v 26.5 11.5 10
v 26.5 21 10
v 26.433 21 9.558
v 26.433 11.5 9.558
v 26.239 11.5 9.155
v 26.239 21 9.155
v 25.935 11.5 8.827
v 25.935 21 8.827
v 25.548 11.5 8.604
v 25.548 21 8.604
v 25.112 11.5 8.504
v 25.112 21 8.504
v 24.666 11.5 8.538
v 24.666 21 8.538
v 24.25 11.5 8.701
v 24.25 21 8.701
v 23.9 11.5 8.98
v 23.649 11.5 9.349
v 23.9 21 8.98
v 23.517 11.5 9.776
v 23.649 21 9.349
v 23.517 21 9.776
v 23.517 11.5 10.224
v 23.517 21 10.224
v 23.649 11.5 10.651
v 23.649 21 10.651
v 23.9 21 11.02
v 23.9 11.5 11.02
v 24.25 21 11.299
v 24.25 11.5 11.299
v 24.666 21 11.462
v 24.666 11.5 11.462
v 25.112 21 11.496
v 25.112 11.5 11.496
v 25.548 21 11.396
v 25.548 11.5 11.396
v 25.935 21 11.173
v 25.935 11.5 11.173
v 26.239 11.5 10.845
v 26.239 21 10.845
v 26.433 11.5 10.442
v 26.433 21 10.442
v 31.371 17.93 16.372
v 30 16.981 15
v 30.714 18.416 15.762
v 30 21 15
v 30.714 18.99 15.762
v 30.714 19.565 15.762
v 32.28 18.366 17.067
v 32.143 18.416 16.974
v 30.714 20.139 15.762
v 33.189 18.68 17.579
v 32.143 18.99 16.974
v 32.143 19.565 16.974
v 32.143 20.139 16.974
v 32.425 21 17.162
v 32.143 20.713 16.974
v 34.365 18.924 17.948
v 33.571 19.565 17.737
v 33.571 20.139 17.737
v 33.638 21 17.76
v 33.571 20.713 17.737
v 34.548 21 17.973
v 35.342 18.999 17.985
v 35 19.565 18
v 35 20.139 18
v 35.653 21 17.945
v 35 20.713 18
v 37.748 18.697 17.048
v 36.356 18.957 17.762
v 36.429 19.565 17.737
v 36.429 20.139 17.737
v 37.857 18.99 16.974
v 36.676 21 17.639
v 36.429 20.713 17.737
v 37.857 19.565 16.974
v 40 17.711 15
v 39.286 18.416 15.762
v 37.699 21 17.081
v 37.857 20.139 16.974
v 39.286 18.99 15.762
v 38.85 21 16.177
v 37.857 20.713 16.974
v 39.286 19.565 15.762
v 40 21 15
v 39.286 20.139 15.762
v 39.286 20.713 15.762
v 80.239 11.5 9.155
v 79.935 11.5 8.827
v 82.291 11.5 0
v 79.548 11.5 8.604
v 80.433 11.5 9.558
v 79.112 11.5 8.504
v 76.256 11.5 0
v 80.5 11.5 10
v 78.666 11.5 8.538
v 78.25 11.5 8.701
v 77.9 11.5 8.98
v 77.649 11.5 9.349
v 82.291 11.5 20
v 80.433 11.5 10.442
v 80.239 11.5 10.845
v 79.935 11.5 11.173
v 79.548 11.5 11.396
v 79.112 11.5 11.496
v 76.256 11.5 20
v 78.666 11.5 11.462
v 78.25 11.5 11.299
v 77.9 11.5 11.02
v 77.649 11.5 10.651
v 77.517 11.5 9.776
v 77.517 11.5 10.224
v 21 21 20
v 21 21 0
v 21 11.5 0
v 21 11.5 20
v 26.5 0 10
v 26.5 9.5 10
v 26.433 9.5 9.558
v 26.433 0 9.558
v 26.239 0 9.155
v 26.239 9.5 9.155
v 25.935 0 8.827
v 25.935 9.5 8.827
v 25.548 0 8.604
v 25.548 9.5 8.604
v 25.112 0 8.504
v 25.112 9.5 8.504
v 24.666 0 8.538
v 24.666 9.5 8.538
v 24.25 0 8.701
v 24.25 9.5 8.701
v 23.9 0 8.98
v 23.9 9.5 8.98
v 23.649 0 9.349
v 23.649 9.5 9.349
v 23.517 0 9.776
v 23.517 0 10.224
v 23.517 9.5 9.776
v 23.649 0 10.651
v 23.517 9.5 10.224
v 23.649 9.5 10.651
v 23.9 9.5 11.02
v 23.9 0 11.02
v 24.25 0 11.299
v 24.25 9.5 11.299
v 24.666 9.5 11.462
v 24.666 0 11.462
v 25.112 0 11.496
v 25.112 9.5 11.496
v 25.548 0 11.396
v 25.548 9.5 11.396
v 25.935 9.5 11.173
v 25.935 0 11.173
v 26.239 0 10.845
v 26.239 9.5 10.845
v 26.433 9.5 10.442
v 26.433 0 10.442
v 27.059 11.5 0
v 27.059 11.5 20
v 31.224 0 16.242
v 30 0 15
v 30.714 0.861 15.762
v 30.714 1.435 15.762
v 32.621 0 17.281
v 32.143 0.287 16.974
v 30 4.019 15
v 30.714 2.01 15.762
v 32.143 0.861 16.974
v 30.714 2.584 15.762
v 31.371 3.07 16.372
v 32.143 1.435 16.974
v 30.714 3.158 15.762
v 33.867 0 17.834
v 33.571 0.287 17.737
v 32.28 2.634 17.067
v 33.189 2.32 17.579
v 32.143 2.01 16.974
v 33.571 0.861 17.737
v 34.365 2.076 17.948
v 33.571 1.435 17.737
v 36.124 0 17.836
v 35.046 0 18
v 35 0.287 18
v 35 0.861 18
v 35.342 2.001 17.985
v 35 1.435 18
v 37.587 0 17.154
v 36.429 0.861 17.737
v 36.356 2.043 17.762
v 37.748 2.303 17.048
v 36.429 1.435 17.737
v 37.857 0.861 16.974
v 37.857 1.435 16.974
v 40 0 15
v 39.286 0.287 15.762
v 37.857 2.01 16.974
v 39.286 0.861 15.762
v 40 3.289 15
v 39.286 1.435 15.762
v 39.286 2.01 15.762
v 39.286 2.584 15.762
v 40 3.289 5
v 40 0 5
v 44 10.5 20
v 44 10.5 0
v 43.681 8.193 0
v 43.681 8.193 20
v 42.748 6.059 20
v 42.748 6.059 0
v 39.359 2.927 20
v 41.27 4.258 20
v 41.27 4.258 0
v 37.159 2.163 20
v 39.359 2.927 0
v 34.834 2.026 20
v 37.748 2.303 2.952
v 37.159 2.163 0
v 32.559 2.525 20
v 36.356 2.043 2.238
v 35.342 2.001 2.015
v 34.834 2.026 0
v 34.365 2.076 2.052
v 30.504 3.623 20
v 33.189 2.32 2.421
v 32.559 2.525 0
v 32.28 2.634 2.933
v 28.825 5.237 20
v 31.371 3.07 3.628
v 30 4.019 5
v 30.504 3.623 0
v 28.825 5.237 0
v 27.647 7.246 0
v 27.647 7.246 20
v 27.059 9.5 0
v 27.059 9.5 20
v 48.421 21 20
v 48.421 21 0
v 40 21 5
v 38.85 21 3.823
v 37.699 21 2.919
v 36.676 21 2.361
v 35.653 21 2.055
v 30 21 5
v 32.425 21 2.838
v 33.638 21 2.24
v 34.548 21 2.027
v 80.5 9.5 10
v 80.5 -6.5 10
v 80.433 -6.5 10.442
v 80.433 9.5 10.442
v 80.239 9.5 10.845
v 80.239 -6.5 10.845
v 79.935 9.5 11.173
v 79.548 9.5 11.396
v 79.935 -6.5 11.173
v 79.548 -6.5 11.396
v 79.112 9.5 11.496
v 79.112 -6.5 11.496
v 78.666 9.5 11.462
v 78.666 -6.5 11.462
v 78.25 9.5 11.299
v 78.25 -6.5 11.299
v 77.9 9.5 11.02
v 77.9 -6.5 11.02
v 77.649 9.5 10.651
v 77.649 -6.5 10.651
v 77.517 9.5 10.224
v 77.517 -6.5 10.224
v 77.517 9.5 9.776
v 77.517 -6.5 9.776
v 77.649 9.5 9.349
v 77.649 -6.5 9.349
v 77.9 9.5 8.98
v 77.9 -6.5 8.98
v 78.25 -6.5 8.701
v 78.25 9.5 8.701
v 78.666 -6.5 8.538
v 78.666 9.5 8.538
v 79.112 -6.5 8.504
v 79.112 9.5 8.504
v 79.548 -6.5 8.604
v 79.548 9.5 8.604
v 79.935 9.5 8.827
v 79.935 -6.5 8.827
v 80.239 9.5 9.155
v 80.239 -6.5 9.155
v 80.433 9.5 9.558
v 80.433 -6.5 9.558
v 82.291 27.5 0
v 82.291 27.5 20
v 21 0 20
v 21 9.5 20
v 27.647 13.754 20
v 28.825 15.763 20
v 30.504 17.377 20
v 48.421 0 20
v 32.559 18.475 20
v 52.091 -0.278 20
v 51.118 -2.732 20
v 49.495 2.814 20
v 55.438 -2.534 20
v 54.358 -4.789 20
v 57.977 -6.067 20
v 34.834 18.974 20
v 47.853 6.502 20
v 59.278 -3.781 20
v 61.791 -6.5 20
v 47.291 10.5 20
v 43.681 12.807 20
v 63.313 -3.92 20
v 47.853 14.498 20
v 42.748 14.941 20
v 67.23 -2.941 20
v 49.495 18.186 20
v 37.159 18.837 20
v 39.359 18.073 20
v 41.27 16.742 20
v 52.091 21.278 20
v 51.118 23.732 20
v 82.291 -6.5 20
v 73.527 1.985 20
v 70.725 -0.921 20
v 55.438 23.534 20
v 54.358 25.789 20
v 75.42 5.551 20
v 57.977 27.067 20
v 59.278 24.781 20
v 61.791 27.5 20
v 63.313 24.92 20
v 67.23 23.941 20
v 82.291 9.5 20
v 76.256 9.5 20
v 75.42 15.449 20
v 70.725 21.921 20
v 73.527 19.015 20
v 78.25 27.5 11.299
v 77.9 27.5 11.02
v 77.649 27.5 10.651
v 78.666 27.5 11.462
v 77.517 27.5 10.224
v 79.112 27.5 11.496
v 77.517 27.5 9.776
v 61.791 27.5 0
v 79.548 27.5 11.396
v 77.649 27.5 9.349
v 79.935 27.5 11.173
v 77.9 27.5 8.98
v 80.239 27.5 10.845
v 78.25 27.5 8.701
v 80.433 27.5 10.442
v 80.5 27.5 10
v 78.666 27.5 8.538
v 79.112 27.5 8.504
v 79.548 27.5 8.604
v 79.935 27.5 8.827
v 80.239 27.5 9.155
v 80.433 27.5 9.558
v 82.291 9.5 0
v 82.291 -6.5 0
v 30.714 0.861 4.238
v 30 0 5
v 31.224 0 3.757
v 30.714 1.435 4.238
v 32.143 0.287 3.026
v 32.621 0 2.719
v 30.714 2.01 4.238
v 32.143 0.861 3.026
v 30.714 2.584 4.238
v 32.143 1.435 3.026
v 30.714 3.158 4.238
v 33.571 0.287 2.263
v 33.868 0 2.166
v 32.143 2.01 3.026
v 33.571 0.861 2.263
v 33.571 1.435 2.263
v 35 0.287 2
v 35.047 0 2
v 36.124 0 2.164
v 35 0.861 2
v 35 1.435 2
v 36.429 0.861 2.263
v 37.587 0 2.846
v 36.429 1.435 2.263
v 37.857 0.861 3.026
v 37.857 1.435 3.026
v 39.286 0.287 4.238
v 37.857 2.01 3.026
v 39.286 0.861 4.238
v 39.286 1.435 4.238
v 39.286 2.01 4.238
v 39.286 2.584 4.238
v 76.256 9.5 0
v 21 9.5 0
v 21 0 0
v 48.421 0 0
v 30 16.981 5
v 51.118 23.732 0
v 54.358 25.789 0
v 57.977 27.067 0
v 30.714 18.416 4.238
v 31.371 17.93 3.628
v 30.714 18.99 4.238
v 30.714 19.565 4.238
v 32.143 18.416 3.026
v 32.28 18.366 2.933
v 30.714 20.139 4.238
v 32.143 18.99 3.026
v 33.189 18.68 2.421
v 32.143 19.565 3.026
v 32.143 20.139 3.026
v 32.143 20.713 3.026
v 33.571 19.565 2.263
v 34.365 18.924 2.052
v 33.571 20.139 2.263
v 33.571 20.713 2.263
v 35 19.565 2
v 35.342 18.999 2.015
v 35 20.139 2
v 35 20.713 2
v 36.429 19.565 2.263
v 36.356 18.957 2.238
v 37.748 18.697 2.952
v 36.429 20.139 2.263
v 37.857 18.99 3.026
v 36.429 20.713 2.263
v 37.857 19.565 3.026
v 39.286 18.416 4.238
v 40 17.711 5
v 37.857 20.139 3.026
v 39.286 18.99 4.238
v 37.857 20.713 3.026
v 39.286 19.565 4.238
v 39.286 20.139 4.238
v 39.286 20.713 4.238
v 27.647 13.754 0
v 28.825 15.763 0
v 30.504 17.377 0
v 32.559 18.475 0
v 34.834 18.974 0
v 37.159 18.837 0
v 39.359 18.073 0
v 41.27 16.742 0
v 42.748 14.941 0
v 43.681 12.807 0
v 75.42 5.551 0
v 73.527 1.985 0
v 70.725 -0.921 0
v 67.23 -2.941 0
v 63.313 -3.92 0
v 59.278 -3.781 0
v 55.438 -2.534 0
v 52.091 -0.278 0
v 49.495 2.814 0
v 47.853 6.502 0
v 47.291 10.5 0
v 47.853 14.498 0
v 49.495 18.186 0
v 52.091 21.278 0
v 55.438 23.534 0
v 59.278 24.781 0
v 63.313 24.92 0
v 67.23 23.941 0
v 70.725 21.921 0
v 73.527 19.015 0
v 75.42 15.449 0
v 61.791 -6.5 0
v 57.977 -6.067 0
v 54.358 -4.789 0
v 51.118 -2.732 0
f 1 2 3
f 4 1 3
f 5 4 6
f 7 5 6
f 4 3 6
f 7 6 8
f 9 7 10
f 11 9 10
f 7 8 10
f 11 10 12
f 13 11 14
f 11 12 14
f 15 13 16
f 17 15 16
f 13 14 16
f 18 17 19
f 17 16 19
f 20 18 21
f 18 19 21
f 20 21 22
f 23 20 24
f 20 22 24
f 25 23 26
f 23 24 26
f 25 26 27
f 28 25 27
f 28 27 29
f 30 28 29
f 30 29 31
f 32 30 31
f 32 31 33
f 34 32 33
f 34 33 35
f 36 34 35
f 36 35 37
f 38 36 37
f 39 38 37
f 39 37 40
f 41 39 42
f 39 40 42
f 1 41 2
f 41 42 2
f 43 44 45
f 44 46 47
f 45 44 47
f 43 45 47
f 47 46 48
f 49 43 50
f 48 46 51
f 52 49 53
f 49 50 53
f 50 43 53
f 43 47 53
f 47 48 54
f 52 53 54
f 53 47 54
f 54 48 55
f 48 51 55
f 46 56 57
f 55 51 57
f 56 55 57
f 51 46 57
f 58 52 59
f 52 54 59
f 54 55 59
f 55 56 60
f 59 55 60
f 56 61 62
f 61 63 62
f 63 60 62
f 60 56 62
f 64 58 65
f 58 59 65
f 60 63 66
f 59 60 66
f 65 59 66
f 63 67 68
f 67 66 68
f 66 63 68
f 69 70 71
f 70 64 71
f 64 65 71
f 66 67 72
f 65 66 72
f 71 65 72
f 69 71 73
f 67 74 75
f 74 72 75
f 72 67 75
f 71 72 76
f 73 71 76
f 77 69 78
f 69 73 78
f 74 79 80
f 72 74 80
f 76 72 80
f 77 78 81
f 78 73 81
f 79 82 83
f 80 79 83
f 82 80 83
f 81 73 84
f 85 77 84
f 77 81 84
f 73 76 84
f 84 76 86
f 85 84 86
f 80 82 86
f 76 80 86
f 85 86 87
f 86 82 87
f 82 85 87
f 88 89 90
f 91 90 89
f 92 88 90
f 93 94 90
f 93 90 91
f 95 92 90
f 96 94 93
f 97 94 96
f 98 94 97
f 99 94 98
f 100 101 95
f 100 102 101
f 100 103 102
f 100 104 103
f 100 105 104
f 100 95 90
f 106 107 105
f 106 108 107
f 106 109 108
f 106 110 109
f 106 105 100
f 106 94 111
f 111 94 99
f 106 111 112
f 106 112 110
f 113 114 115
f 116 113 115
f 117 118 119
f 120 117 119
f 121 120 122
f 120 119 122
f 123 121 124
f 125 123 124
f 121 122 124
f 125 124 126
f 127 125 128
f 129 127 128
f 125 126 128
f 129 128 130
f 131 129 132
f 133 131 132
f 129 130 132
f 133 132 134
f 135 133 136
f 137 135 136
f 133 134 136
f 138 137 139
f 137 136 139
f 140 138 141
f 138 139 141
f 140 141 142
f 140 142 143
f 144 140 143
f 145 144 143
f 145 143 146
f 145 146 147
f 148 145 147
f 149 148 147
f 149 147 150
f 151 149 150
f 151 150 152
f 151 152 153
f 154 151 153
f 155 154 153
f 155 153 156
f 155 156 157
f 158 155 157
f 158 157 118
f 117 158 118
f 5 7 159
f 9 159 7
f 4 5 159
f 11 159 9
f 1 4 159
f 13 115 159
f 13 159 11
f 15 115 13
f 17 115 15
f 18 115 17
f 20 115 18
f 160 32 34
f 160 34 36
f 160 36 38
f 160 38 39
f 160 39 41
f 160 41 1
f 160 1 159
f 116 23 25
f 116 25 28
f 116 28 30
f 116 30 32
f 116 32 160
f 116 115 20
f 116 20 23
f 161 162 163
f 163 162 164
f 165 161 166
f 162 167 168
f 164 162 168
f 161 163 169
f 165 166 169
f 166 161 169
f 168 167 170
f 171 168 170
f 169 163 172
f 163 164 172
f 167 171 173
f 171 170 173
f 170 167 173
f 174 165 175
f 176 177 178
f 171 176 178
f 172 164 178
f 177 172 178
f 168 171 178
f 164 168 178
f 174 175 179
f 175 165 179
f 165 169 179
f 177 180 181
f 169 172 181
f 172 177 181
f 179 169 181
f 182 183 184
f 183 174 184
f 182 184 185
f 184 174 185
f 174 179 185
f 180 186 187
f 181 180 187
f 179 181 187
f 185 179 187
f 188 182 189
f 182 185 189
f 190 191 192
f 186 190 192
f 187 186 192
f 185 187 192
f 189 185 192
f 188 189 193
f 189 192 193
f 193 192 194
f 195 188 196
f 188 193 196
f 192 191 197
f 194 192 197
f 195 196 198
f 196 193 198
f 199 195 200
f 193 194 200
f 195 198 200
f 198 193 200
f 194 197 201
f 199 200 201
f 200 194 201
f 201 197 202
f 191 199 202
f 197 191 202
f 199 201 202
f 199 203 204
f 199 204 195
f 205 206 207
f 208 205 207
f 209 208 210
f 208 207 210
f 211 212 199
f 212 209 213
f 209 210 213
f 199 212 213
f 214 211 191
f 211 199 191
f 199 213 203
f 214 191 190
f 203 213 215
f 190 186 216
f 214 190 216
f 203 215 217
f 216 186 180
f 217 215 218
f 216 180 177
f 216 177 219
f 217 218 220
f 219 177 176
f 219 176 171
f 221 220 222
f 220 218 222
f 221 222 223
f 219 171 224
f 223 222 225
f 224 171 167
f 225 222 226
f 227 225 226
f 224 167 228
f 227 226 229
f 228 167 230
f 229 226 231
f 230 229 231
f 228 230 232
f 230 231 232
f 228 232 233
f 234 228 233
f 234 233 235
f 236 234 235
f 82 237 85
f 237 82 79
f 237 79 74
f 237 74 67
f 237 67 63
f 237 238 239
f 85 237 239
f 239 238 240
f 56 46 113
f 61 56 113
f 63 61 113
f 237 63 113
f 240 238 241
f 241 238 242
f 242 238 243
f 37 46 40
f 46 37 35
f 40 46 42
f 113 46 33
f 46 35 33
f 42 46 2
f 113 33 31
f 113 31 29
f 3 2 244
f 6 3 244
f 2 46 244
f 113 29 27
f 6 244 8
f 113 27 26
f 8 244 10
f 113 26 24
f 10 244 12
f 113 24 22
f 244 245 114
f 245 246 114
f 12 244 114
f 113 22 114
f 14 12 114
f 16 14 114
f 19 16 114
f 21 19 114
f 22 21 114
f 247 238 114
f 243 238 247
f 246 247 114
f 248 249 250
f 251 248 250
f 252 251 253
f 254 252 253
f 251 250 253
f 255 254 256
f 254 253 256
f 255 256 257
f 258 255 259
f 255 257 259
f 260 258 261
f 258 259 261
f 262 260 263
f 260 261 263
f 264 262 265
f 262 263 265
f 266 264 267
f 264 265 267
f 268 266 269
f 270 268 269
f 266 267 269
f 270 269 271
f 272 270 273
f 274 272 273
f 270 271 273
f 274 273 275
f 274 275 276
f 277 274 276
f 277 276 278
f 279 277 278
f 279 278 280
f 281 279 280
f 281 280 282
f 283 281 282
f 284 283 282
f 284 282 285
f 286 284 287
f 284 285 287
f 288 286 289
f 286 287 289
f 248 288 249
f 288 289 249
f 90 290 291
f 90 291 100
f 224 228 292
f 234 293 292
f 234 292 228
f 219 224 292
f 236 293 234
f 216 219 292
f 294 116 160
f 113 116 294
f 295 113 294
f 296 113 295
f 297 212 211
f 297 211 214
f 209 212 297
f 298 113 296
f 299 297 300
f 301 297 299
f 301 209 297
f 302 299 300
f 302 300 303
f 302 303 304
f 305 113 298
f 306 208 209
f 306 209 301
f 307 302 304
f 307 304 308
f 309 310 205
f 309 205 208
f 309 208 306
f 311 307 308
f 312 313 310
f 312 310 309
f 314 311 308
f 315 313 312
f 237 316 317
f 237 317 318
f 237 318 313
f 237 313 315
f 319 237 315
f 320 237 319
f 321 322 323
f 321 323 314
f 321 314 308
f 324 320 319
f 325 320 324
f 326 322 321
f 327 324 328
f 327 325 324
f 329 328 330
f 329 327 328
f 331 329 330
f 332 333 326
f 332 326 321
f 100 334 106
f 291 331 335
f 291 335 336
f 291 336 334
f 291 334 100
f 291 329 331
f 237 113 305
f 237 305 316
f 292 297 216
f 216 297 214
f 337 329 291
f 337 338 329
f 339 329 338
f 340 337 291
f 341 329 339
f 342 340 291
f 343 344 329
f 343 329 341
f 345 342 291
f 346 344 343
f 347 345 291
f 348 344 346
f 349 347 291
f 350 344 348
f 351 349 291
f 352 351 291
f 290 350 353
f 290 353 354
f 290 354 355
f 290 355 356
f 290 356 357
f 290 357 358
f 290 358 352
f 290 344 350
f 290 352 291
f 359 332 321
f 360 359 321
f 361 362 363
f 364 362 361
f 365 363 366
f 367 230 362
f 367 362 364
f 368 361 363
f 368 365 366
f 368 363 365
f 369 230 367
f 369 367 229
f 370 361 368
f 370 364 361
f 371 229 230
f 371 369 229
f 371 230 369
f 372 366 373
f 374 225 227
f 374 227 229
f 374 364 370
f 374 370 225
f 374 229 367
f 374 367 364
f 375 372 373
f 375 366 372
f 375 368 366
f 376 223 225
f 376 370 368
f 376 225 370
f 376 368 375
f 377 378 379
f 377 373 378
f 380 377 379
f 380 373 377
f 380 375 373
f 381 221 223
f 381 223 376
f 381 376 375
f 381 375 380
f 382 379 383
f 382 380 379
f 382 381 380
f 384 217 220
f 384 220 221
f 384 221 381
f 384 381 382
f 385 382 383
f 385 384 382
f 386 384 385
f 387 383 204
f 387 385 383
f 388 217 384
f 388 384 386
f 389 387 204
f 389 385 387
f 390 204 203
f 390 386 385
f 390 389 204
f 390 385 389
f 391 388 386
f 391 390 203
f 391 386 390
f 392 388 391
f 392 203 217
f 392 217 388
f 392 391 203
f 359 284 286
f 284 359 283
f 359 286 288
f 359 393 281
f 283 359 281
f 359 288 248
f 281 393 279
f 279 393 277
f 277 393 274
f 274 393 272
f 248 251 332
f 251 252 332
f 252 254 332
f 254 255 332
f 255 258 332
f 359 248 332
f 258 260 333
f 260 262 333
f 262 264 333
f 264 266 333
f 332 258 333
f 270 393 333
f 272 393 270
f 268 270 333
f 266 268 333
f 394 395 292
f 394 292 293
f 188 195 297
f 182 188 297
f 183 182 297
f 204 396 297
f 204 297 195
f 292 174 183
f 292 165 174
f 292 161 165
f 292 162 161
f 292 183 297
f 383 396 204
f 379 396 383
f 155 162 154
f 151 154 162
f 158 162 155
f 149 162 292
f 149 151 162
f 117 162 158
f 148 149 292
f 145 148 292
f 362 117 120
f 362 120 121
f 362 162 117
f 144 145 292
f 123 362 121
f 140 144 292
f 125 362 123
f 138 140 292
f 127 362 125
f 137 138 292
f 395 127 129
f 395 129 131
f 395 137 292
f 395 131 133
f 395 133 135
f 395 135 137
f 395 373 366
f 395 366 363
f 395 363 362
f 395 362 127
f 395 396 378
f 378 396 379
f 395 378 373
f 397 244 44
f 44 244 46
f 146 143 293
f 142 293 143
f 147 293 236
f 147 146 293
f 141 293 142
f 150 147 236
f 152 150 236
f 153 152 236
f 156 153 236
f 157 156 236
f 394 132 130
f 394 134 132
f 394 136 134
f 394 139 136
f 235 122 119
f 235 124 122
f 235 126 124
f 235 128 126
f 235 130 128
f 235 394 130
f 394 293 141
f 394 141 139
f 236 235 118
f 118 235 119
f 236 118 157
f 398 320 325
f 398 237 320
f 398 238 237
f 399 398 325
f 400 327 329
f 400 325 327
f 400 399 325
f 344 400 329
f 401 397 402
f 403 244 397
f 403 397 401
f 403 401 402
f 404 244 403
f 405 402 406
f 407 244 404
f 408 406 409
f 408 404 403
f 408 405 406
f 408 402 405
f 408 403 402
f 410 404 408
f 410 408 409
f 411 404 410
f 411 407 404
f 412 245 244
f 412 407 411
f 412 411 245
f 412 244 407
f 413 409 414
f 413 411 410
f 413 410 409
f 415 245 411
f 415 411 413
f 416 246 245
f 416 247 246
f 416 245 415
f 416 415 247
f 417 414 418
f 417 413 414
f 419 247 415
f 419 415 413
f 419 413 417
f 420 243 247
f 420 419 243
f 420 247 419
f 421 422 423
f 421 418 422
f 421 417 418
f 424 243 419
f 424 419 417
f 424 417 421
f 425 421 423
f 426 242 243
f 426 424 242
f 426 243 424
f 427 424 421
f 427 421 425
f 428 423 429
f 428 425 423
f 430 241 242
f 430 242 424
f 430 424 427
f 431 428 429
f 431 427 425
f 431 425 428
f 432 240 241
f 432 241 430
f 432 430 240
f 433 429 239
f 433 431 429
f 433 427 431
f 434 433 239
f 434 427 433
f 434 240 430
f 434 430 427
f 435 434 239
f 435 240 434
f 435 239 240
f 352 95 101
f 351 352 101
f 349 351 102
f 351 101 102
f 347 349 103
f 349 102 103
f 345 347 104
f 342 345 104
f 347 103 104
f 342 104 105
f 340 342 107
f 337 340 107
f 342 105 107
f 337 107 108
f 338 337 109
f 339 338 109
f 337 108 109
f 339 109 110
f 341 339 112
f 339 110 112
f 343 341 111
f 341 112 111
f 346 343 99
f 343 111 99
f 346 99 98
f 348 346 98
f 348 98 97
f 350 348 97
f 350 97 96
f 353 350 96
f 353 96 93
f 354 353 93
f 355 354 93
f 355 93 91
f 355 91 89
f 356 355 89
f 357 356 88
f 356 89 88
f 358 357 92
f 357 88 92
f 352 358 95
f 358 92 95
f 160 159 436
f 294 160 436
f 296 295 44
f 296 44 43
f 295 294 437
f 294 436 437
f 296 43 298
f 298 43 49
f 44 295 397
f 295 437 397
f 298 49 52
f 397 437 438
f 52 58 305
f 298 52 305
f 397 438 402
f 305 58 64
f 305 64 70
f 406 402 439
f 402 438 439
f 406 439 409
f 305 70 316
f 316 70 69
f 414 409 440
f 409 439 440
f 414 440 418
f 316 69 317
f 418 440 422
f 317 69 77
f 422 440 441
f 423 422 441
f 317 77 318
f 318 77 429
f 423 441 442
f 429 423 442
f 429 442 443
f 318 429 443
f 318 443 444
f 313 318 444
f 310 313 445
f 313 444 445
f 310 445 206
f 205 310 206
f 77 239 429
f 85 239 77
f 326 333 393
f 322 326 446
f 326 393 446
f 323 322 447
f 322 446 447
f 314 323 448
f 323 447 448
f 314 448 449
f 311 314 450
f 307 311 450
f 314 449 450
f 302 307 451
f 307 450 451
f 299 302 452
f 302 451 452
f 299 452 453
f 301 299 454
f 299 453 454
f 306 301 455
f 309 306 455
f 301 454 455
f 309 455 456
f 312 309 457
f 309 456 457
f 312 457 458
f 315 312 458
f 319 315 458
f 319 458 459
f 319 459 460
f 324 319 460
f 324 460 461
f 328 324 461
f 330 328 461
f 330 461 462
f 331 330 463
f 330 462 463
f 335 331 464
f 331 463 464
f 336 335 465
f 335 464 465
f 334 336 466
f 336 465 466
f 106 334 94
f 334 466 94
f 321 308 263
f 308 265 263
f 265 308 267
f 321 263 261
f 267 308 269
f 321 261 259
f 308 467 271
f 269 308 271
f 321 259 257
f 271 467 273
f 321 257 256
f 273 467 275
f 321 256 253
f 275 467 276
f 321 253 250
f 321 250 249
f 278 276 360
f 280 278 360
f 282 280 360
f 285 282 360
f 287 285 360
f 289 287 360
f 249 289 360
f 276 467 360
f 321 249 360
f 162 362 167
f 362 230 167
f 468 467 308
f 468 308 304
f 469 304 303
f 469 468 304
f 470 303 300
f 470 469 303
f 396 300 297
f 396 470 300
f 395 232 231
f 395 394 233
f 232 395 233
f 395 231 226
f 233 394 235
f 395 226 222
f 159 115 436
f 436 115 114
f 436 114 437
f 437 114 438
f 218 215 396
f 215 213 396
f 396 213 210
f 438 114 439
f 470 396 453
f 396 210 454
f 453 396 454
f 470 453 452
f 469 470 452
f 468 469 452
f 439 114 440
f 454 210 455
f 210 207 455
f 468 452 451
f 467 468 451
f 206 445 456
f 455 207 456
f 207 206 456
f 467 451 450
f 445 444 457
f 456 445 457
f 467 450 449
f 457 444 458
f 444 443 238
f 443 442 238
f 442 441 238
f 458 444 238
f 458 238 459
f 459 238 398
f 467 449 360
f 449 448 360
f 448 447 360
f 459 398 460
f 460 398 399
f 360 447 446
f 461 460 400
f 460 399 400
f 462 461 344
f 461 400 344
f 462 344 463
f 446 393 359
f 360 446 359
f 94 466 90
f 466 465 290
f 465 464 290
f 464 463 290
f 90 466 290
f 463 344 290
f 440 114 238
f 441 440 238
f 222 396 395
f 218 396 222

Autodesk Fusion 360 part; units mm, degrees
sketch "Sketch1" plane through (0, 0, 0) normal (0, 0, 1) x (1, 0, 0)
  line L0 (25, 0) -> (25, 21)
  line L1 (25, 21) -> (46, 21)
  line L2 (46, 21) -> (46, 0)
  line L3 (46, 0) -> (25, 0)
  line L4 (35.5, 21) -> (35.5, 19)
  line L5 (35.5, 0) -> (35.5, 2)
  line L6 (25, 10.5) -> (28, 10.5)
  line L7 (25, 19) -> (35.5, 19)
  line L8 (25, 2) -> (35.5, 2)
  line L9 (28, 21) -> (28, 0)
  line L10 (35.5, 19) -> (35.5, 2)
  line L11 (28, 10.5) -> (35.5, 10.5)
  circle A0 centre (35.5, 10.5) radius 8.5
  line L12 (44, 10.5) -> (47.291, 10.5)
  line L13 (47.291, 10.5) -> (61.791, 10.5)
  circle A1 centre (61.791, 10.5) radius 14.5
  circle A2 centre (61.791, 10.5) radius 17
  line L14 (46, 21) -> (48.4213, 21)
  line L15 (46, 0) -> (48.4213, 0)
  line L16 (61.791, 10.5) -> (61.791, 27.5)
  line L17 (61.791, 10.5) -> (61.791, -6.5)
  line L18 (61.791, -6.5) -> (79.291, -6.5)
  line L19 (61.791, 27.5) -> (79.291, 27.5)
  line L20 (79.291, 27.5) -> (79.291, -6.5)
  line L21 (79.291, 27.5) -> (76.291, 27.5)
  line L22 (76.291, 27.5) -> (76.291, 11.5)
  line L23 (76.291, 11.5) -> (79.291, 11.5)
  line L24 (76.291, -6.5) -> (76.291, 9.5)
  line L25 (76.291, 9.5) -> (79.291, 9.5)
  line L26 (27, 10.5) -> (24, 10.5)
  line L27 (25, 21) -> (24, 21)
  line L28 (24, 21) -> (24, 11.5)
  line L29 (24, 11.5) -> (25, 11.5)
  line L30 (24, 0) -> (24, 9.5)
  line L31 (24, 9.5) -> (25, 9.5)
  line L32 (25, 0) -> (24, 0)
  dimension "d1" = 21
  dimension "d2" = 21
  dimension "d4" = 3
  dimension "d5" = 17
  dimension "d6" = 3.291
  dimension "d7" = 14.5
  dimension "d8" = 34
  dimension "d9" = 17.5
  dimension "d10" = 17.5
  dimension "d11" = 3
  dimension "d12" = 16
  dimension "d13" = 16
  dimension "d14" = 9.5
  dimension "d15" = 9.5
extrude "Extrude1" add sketch "Sketch1" along normal blind 20
extrude "Extrude2" cut sketch "Sketch1" along normal blind 24 contours L9 L10 L11 A0 | L10 A0 | L6 L9 A0 | L6 L9 A0 | L9 L10 L11 A0 | L13 A1 L16 | L13 A1 L17 | A1 L16 L17
box "BoxPrimitive1" cut length 2 width 3.1 height 22 placed x (0, -1, 0) y (1, 0, 0) z (0, 0, 1) at (76.2, 11.5, 0)
box "BoxPrimitive2" cut length 2 width 3.5 height 21 placed x (0, -1, 0) y (1, 0, 0) z (0, 0, 1) at (24, 11.5, 0)
sketch "Sketch8" plane through (0, 21, 0) normal (0, 1, 0) x (-1, 0, 0)
  line L0 (-48.4213, 0) -> (-24, 0)
  line L1 (-24, 0) -> (-24, 20)
  line L2 (-24, 20) -> (-48.4213, 20)
  line L3 (-48.4213, 20) -> (-48.4213, 0)
  line L4 (-30, 5) -> (-30, 15)
  line L5 (-40, 5) -> (-40, 15)
  spline S0 degree 5 poles (-30, 5) (-30.2, 4.7725) (-30.6, 4.3372) (-31.2, 3.744) (-32, 3.0743) (-33, 2.4528) (-34, 2.0663) (-35, 1.934) (-36, 2.0663) (-37, 2.4528) (-38, 3.0743) (-38.8, 3.744) (-39.4, 4.3372) (-39.8, 4.7725) (-40, 5) knots 0 0 0 0 0 0 0.1 0.2 0.3 0.4 0.5 0.6 0.7 0.8 0.9 1 1 1 1 1 1
  spline S1 degree 5 poles (-30, 15) (-30.2, 15.2275) (-30.6, 15.6628) (-31.2, 16.256) (-32, 16.9257) (-33, 17.5472) (-34, 17.9337) (-35, 18.066) (-36, 17.9337) (-37, 17.5472) (-38, 16.9257) (-38.8, 16.256) (-39.4, 15.6628) (-39.8, 15.2275) (-40, 15) knots 0 0 0 0 0 0 0.1 0.2 0.3 0.4 0.5 0.6 0.7 0.8 0.9 1 1 1 1 1 1
  point P0 (-35, 2)
  point P1 (-35, 18)
extrude "Extrude3" add 2 faces at (24, 14.6667, 13.3333) (24, 3.1667, 6.6667) along direction (-1, 0, 0) blind 3
cylinder "CylinderPrimitive3" cut diameter 3 height -23 placed x (1, 0, 0) y (0, 0, -1) z (0, 1, 0) at (25, 21, 10)
extrude "Extrude4" cut sketch "Sketch8" against normal blind 24 contours L4 L5 S0 S1
extrude "Extrude5" add 2 faces at (79.291, 4.1667, 6.6667) (79.291, 22.1667, 6.6667) along direction (1, 0, 0) blind 3
cylinder "CylinderPrimitive4" cut diameter 3 height -36 placed x (1, 0, 0) y (0, 0, 1) z (0, -1, 0) at (79, -6.5, 10)
